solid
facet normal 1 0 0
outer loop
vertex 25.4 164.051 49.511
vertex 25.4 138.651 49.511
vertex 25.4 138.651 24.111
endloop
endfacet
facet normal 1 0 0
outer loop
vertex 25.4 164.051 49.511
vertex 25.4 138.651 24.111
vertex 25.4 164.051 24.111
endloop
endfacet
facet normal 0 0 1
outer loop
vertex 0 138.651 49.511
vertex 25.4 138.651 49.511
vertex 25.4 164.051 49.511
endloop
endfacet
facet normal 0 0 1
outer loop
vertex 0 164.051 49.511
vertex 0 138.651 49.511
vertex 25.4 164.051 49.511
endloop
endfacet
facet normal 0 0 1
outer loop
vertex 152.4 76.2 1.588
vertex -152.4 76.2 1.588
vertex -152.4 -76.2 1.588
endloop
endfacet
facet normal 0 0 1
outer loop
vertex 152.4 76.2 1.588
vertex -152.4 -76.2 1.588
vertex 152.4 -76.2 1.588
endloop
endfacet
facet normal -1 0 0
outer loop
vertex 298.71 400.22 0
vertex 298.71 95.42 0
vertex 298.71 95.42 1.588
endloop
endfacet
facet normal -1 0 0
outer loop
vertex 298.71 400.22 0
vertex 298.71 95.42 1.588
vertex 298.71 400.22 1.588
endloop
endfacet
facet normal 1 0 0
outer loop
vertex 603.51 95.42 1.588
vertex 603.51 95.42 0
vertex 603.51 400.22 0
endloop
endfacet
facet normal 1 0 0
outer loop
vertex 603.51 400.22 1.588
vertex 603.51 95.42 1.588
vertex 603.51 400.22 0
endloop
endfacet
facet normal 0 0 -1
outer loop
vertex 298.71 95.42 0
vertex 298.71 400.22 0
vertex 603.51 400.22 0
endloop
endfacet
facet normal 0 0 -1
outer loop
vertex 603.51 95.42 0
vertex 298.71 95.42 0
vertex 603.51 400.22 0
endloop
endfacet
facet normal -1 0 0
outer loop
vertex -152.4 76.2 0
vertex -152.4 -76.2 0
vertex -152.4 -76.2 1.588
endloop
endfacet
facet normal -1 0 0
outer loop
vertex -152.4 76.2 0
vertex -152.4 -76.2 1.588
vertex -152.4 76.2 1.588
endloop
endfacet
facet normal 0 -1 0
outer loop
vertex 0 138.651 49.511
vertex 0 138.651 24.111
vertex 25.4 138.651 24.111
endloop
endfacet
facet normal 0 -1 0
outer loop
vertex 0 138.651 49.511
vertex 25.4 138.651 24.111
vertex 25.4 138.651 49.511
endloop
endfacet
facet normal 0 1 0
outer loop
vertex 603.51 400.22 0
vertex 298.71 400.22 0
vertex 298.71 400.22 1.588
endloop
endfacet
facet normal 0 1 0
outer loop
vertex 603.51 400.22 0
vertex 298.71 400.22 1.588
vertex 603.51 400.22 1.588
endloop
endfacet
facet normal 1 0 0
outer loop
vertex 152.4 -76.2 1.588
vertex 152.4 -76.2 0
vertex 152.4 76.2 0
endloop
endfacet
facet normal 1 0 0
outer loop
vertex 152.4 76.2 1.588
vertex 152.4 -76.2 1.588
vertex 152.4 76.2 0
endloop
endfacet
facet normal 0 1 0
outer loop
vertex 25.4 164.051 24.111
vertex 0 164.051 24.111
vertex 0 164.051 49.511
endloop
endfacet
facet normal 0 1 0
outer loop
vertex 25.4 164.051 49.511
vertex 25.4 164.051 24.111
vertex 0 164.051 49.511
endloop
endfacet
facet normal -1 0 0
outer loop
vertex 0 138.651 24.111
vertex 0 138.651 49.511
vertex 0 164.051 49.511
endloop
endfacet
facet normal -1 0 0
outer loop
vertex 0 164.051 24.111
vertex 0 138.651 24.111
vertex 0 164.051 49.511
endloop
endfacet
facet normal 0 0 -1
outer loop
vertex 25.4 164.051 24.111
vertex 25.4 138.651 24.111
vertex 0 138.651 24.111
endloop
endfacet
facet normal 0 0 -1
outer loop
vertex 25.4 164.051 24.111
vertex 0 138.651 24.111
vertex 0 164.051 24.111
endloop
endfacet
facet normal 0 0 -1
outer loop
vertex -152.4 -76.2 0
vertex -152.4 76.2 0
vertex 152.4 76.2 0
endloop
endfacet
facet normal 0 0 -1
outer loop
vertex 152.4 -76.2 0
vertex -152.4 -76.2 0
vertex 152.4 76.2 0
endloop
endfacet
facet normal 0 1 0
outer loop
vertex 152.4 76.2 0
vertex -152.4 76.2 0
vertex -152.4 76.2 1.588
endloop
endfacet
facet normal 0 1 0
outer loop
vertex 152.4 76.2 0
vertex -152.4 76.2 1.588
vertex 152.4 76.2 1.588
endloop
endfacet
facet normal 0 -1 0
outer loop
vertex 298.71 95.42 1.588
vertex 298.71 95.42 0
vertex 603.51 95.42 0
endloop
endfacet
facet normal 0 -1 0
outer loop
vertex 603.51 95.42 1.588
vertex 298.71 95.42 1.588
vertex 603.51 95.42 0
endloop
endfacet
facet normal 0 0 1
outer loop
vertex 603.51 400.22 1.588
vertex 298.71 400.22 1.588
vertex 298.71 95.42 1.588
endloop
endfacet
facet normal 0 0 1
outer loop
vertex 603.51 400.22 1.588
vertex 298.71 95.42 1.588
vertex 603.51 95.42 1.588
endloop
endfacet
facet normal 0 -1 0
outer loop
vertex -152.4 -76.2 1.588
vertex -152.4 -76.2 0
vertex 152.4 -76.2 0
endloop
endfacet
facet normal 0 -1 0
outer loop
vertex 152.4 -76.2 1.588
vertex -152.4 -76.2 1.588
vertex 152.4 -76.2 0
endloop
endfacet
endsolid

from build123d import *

# Parameters (mm, degrees)
F0_W     = 304.8
F0_H     = 152.4
F1_DEPTH = 1.5875
F2_W     = 304.8
F2_H     = 304.8
F3_DEPTH = 1.5875
F4_W     = 25.4
F4_H     = 25.4
F5_DEPTH = 25.4


# Not quite as in the source:
# - a length typed as a fraction of an inch, garbled in the dataset ("3 / 203.2 mm" for 3/8 in), is restored


with BuildPart() as f1:
    # F0 (on Top) → F1 (new body)
    with BuildSketch(Plane.XY):
        Rectangle(F0_W, F0_H)
    extrude(amount=F1_DEPTH)


with BuildPart() as f3:
    # F2 (on Top) → F3 (new body)
    with BuildSketch(Plane.XY):
        with Locations((451.110124588, 247.8200285587)):
            Rectangle(F2_W, F2_H)
    extrude(amount=F3_DEPTH)


with BuildPart() as f5:
    # F4 (on Right) → F5 (new body)
    with BuildSketch(Plane.YZ):
        with Locations((151.3509980978, 36.8112660944)):
            Rectangle(F4_W, F4_H)
    extrude(amount=F5_DEPTH)


solid = Compound([f1.part, f3.part, f5.part])
